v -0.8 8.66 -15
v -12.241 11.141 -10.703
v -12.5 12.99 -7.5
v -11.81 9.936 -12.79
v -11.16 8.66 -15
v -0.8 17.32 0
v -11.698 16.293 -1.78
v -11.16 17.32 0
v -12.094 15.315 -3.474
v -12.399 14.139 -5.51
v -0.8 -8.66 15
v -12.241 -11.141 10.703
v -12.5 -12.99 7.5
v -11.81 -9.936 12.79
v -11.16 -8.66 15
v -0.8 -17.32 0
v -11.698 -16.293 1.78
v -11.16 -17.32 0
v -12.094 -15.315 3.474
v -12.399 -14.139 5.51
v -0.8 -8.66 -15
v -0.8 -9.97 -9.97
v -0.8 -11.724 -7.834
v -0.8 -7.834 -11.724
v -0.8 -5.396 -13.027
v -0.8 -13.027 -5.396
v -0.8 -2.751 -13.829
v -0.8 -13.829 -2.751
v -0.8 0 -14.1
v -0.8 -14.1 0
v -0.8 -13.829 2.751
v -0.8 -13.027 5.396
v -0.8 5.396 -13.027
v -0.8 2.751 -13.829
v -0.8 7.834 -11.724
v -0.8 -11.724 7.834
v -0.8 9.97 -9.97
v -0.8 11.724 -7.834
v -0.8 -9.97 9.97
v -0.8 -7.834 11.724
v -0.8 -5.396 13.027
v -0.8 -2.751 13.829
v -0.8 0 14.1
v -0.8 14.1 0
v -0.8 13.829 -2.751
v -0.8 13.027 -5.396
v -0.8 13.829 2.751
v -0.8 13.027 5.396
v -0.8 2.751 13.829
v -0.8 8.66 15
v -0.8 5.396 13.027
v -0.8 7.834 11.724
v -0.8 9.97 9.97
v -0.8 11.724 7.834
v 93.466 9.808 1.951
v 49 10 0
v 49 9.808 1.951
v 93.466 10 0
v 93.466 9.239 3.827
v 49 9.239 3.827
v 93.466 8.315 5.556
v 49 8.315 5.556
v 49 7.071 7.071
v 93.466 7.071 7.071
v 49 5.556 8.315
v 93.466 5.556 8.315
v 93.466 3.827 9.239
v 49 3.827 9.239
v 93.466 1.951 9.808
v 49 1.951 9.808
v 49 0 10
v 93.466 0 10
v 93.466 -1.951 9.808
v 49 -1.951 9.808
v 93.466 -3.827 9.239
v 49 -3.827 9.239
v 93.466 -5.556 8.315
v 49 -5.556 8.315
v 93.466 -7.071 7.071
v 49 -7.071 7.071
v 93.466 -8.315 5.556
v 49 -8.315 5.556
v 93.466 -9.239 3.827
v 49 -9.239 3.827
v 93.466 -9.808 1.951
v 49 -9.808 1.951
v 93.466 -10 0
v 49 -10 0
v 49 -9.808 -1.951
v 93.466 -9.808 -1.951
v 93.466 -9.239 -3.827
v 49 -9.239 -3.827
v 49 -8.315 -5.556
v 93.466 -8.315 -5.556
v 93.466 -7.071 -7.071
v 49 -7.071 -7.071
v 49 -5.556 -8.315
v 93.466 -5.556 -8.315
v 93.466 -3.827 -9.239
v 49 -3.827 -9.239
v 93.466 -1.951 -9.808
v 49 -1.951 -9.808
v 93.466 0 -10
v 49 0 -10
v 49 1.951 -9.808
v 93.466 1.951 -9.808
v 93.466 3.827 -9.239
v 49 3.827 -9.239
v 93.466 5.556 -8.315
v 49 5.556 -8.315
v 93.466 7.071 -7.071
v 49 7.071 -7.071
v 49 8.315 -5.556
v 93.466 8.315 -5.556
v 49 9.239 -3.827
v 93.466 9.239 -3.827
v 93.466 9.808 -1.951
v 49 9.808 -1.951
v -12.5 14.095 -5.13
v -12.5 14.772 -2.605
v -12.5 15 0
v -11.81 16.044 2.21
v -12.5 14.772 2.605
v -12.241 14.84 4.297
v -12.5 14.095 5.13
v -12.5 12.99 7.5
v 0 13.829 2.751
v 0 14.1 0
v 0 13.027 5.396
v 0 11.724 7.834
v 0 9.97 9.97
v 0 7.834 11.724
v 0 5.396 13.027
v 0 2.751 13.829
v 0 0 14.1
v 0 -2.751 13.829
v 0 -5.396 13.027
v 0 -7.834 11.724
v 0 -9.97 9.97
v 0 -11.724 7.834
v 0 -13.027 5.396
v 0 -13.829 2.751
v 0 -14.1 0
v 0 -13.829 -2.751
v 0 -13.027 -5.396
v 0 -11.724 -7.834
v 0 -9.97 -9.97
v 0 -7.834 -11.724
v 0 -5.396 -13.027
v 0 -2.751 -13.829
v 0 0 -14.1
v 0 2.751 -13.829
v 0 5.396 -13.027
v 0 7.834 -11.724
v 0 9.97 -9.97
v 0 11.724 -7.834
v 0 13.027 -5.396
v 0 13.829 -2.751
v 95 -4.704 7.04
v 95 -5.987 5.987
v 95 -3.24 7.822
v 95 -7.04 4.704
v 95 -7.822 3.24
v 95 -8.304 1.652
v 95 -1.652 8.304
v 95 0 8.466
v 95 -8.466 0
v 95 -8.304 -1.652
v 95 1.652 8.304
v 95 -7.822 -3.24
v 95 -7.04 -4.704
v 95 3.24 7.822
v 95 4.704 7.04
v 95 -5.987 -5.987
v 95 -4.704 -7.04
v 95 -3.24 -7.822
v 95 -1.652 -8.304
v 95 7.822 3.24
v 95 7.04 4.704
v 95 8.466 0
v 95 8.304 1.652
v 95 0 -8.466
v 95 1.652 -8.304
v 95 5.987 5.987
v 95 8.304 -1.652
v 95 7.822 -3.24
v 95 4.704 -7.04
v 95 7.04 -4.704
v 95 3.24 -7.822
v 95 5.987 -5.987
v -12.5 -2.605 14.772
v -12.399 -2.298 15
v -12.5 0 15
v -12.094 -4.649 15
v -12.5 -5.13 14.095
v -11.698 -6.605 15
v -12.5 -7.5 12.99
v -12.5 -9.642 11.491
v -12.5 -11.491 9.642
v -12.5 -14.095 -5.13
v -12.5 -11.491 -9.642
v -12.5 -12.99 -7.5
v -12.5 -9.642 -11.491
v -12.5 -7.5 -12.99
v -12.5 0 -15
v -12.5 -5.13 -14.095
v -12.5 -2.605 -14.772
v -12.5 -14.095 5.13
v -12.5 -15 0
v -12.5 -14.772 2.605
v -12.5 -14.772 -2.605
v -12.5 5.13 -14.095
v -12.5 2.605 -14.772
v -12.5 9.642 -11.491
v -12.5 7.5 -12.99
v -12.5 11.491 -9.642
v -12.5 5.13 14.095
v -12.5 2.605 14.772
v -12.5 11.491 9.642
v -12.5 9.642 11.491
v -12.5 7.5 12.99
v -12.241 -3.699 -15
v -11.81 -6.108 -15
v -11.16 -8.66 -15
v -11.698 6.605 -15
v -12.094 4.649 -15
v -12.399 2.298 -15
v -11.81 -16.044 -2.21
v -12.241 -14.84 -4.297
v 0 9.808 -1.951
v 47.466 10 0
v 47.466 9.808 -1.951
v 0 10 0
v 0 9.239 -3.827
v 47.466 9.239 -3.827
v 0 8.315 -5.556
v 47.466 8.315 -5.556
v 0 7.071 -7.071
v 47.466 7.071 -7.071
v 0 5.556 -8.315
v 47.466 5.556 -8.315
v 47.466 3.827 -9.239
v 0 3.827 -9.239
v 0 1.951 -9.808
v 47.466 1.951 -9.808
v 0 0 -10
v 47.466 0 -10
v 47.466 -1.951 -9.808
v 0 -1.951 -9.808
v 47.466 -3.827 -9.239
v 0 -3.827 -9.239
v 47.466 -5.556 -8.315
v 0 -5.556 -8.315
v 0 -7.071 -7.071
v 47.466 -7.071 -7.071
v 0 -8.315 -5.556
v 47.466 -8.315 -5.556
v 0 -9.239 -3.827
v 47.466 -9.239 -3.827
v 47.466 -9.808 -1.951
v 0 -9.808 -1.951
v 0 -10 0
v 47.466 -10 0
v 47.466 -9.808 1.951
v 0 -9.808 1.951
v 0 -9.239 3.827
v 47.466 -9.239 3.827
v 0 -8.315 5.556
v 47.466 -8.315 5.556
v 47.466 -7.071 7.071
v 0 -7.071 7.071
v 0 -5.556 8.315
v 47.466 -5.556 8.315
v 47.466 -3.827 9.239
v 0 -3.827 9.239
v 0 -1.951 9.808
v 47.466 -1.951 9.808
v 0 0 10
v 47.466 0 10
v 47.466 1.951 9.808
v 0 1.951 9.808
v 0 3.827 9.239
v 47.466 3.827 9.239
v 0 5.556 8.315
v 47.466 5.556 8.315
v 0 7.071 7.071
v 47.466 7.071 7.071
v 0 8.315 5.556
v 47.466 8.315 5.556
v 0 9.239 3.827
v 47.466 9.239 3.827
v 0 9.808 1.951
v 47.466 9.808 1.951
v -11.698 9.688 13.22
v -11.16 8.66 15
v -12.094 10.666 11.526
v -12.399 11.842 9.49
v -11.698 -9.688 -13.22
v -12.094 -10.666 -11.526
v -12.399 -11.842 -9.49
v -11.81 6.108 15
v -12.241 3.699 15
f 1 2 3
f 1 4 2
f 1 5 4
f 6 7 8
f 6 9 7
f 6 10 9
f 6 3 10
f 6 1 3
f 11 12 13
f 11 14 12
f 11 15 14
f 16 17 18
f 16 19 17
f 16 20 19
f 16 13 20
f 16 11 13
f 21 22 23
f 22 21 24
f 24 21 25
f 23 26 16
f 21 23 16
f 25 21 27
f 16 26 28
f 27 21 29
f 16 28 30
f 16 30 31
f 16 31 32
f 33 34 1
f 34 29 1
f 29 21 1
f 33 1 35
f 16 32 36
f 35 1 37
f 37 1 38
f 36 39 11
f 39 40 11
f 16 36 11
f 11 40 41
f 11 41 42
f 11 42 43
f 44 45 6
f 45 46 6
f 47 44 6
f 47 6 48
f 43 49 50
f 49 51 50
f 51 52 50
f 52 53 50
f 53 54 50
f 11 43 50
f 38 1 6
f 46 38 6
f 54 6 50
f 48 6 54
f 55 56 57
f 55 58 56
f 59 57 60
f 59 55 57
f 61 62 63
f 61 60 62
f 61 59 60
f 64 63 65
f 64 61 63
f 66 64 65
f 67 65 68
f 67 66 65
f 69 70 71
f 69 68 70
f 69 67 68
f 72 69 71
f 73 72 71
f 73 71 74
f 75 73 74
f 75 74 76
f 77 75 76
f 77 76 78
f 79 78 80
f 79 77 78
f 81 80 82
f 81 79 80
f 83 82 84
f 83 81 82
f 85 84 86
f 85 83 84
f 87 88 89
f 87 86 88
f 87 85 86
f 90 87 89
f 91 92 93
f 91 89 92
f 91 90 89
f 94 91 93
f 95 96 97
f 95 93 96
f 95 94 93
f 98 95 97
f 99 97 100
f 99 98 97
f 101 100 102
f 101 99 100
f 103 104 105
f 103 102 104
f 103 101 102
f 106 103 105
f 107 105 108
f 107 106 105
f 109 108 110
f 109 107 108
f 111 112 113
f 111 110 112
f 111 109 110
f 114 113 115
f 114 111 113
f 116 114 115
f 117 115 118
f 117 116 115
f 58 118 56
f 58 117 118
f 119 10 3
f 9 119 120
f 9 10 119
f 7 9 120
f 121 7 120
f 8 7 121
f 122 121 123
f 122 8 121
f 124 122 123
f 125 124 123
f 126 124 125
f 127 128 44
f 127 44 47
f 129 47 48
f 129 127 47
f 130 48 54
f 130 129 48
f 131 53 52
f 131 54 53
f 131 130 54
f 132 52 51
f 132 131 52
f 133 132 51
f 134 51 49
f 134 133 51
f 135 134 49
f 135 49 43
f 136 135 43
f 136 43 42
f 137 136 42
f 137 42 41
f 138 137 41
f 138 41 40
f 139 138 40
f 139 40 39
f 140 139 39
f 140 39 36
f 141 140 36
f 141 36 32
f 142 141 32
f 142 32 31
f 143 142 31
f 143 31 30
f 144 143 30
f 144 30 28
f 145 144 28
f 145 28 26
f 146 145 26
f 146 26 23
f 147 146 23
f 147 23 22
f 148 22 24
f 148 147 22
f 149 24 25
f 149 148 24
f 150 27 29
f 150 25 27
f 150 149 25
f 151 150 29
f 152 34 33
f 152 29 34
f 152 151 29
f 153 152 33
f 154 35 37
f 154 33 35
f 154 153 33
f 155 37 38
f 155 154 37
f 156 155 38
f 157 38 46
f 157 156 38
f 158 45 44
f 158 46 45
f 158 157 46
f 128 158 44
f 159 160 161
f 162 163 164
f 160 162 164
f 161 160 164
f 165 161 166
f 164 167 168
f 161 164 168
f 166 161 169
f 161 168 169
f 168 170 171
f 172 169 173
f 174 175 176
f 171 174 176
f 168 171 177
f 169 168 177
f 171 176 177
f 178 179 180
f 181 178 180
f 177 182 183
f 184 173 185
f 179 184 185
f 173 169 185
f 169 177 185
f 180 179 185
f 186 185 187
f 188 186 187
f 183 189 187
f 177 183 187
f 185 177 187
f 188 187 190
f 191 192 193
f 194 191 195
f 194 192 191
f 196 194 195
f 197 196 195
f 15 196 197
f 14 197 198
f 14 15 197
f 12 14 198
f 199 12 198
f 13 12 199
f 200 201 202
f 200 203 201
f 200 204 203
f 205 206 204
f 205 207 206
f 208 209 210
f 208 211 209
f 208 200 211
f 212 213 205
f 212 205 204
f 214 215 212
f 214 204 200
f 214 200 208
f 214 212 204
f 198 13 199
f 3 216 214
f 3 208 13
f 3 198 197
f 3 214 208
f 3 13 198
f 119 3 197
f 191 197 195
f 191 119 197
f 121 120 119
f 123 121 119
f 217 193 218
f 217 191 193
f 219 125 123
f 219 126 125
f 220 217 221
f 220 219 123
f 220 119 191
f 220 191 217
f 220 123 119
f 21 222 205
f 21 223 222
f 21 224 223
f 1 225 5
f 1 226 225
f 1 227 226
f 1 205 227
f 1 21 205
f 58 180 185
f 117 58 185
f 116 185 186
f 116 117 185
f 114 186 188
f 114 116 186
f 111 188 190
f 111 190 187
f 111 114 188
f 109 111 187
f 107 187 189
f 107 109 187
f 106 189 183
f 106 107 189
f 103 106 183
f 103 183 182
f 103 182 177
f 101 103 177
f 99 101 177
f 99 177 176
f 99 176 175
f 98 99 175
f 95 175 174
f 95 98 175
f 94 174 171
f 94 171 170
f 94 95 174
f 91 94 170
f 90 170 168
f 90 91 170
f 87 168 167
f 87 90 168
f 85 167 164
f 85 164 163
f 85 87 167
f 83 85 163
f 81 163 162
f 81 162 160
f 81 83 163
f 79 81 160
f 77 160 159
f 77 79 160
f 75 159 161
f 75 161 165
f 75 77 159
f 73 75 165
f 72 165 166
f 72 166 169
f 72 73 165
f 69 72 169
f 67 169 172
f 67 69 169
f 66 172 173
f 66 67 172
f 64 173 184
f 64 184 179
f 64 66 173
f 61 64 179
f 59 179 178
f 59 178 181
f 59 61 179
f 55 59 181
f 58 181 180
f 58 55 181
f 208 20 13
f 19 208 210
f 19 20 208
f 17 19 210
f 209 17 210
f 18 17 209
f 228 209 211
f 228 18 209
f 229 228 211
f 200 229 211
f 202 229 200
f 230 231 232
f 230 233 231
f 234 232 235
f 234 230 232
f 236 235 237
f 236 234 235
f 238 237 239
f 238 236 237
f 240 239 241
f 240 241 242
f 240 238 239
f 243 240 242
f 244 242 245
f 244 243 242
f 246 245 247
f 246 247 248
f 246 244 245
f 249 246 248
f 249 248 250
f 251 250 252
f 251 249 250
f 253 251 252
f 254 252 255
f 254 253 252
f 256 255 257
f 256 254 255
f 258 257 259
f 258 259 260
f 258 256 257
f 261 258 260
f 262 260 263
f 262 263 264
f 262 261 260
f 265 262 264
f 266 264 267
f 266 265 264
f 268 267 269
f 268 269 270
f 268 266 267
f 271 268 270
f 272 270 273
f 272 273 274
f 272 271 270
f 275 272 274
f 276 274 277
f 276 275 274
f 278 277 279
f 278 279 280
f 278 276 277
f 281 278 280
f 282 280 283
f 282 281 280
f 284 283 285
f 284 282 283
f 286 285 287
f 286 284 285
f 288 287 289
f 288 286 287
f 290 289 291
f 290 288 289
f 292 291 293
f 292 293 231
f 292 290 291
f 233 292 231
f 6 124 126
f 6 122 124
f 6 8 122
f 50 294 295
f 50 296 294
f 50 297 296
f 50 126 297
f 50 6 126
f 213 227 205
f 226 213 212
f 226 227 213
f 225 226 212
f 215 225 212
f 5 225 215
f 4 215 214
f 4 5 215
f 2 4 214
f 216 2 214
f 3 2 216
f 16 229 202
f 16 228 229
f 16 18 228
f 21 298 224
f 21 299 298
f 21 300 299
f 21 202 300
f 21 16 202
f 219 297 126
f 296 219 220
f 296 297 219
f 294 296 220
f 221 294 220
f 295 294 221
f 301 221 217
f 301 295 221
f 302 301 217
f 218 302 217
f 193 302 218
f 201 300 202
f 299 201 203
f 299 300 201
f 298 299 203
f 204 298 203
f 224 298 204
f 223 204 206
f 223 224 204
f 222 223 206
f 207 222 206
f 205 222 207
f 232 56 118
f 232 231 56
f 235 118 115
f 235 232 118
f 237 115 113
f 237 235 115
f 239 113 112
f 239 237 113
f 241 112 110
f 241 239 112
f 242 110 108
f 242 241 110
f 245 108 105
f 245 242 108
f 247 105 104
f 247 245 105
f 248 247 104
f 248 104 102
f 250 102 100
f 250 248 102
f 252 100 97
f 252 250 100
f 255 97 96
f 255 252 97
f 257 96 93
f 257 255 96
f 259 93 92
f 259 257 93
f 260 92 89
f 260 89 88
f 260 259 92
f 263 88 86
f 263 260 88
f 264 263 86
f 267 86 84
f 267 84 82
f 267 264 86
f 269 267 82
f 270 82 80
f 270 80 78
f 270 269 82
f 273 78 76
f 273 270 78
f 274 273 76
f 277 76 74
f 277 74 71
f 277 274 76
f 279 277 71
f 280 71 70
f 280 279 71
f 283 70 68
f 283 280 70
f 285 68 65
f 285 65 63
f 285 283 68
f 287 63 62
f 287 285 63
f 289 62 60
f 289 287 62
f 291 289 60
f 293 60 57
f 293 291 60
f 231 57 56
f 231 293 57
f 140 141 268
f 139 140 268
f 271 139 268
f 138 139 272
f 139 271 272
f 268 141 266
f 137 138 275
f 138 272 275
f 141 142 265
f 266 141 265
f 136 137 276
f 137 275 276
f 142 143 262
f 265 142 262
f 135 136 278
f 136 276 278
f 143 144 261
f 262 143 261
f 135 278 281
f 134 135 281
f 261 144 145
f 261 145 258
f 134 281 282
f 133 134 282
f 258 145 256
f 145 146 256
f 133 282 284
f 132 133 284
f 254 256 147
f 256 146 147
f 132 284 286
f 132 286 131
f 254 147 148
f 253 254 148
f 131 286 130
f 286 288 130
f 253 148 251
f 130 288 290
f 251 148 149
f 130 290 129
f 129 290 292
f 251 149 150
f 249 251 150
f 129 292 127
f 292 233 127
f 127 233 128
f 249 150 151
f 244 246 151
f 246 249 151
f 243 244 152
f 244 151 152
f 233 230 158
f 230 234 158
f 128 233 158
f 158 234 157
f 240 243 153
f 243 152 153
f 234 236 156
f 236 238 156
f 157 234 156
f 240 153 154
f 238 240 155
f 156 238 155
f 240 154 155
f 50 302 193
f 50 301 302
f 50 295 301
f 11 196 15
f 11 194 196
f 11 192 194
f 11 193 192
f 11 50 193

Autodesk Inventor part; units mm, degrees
ref_plane "YZ Plane" through (0, 0, 0) normal (1, 0, 0) x (0, 1, 0)
ref_plane "XZ Plane" through (0, 0, 0) normal (0, 1, 0) x (-1, 0, 0)
sketch "Sketch1" plane through (0, 0, 0) normal (0, 0, 1) x (1, 0, 0)
  line L0 (0, 14.1) -> (0, 10)
  line L1 (49, 10) -> (95, 10)
  line L2 (95, 10) -> (95, 0)
  line L3 (95, 0) -> (-0.8001, 0)
  line L4 (-19.9601, 0) -> (114.16, 0) projected
  line L5 (-0.8001, 0) -> (-0.8001, 14.1)
  line L6 (-0.8001, 14.1) -> (0, 14.1)
  line L7 (49, 10) -> (47.4663, 10)
  line L8 (47.4663, 10) -> (0, 10)
  line L9 (0, -2.82) -> (0, 16.92) projected
  dimension "d0" = 95
  dimension "d1" = 46
  dimension "d2" = 20
  dimension "d9" = 0.8001
  dimension "d10" = 28.2
  dimension "d13" = 1.5337
  dimension "d14" = 20
revolve "Body" add sketch "Sketch1" angle 360 about axis through (95, 0, 0) along (-1, 0, 0)
sketch "Sketch2" plane through (-0.8001, 0, 0) normal (-1, 0, 0) x (0, 0, 1)
  line L0 (0, 17.3205) -> (15, 8.6603)
  line L1 (15, 8.6603) -> (15, -8.6603)
  line L2 (15, -8.6603) -> (0, -17.3205)
  line L3 (0, -17.3205) -> (-15, -8.6603)
  line L4 (-15, -8.6603) -> (-15, 8.6603)
  line L5 (-15, 8.6603) -> (0, 17.3205)
  point P0 (0, 0)
  point P1 (0, 0)
  dimension "d11" = 30
extrude "Head" add sketch "Sketch2" along normal blind 11.7
sketch "Sketch4" plane through (0, 0, 0) normal (0, 0, 1) x (1, 0, 0)
  line L0 (-12.5001, 15) -> (-12.5001, 17.3205)
  line L1 (-12.5001, 17.3205) -> (-11.1604, 17.3205)
  line L2 (-11.1604, 17.3205) -> (-12.5001, 15)
  line L3 (-14.8401, 0) -> (1.5399, 0) projected
  line L4 (-0.8001, 17.3205) -> (-12.5001, 17.3205) projected
  line L5 (-12.5001, 8.6603) -> (-12.5001, 17.3205) projected
  dimension "d5" = 30
  dimension "d19" = 30
revolve "Chamfer1" cut sketch "Sketch4" angle 360 about axis through (-10, 0, 0) along (1, 0, 0)
thread "Thread" size "M20x2.5" class "6g" standard "ISO Metric profile" length 46
chamfer "Chamfer2" distance 1.5336 distance2 1.5337 1 edges at (95, -10, 0) measured on face at (95, -2.495, 2.2104)
ref_plane "Work Plane1" through (1.525, 0, 0) normal (0, 0, 1) x (1, 0, 0)
equation "\"d0\" = NLG"
equation "\"d1\" = GEL"
equation "\"d2\" = GD"
equation "\"d10\" = SD2"
equation "\"d14\" = BDM"
equation "\"d11\" = SW"
equation "\"d3\" = KOH - SD"
equation "\"d5\" = ANG1"
equation "\"d19\" = SW0"
equation "\"d15\" = GEL"
equation "\"d6\" = -0.5 * SPD + 0.5 * GD"
equation "\"NLG\" = 95"
equation "\"GD\" = NND"
equation "\"BDM\" = NND"
equation "\"KOH\" = 12.5"
equation "\"GEL\" = 46"
equation "\"SW\" = 30"
equation "\"SW0\" = SW"
equation "\"SPD\" = NND - 1.2269 * PTC"
equation "\"SD2\" = 28.2"
equation "\"SD\" = 0.8"
equation "\"ANG1\" = 30deg"
equation "\"GAL\" = 0.61345 * PTC"
equation "\"GUL\" = 0.61345 * PTC"
equation "\"RR\" = 0.8"
equation "\"WFT\" = SD"
equation "\"GD1\" = THREADDIA - 1.2269 * PTC"
equation "\"SDH\" = 28.2"
equation "\"TOA\" = 30deg"
equation "\"FAWI\" = 45deg"
equation "\"PTC\" = 2.5"
equation "\"E0\" = 1.155 * SW"
equation "\"NND\" = 20"
equation "\"THREADDIA\" = 20"
properties part number "Bolt M20x95-8.8-A PN-85/M-82101" material "Steel, Mild"
